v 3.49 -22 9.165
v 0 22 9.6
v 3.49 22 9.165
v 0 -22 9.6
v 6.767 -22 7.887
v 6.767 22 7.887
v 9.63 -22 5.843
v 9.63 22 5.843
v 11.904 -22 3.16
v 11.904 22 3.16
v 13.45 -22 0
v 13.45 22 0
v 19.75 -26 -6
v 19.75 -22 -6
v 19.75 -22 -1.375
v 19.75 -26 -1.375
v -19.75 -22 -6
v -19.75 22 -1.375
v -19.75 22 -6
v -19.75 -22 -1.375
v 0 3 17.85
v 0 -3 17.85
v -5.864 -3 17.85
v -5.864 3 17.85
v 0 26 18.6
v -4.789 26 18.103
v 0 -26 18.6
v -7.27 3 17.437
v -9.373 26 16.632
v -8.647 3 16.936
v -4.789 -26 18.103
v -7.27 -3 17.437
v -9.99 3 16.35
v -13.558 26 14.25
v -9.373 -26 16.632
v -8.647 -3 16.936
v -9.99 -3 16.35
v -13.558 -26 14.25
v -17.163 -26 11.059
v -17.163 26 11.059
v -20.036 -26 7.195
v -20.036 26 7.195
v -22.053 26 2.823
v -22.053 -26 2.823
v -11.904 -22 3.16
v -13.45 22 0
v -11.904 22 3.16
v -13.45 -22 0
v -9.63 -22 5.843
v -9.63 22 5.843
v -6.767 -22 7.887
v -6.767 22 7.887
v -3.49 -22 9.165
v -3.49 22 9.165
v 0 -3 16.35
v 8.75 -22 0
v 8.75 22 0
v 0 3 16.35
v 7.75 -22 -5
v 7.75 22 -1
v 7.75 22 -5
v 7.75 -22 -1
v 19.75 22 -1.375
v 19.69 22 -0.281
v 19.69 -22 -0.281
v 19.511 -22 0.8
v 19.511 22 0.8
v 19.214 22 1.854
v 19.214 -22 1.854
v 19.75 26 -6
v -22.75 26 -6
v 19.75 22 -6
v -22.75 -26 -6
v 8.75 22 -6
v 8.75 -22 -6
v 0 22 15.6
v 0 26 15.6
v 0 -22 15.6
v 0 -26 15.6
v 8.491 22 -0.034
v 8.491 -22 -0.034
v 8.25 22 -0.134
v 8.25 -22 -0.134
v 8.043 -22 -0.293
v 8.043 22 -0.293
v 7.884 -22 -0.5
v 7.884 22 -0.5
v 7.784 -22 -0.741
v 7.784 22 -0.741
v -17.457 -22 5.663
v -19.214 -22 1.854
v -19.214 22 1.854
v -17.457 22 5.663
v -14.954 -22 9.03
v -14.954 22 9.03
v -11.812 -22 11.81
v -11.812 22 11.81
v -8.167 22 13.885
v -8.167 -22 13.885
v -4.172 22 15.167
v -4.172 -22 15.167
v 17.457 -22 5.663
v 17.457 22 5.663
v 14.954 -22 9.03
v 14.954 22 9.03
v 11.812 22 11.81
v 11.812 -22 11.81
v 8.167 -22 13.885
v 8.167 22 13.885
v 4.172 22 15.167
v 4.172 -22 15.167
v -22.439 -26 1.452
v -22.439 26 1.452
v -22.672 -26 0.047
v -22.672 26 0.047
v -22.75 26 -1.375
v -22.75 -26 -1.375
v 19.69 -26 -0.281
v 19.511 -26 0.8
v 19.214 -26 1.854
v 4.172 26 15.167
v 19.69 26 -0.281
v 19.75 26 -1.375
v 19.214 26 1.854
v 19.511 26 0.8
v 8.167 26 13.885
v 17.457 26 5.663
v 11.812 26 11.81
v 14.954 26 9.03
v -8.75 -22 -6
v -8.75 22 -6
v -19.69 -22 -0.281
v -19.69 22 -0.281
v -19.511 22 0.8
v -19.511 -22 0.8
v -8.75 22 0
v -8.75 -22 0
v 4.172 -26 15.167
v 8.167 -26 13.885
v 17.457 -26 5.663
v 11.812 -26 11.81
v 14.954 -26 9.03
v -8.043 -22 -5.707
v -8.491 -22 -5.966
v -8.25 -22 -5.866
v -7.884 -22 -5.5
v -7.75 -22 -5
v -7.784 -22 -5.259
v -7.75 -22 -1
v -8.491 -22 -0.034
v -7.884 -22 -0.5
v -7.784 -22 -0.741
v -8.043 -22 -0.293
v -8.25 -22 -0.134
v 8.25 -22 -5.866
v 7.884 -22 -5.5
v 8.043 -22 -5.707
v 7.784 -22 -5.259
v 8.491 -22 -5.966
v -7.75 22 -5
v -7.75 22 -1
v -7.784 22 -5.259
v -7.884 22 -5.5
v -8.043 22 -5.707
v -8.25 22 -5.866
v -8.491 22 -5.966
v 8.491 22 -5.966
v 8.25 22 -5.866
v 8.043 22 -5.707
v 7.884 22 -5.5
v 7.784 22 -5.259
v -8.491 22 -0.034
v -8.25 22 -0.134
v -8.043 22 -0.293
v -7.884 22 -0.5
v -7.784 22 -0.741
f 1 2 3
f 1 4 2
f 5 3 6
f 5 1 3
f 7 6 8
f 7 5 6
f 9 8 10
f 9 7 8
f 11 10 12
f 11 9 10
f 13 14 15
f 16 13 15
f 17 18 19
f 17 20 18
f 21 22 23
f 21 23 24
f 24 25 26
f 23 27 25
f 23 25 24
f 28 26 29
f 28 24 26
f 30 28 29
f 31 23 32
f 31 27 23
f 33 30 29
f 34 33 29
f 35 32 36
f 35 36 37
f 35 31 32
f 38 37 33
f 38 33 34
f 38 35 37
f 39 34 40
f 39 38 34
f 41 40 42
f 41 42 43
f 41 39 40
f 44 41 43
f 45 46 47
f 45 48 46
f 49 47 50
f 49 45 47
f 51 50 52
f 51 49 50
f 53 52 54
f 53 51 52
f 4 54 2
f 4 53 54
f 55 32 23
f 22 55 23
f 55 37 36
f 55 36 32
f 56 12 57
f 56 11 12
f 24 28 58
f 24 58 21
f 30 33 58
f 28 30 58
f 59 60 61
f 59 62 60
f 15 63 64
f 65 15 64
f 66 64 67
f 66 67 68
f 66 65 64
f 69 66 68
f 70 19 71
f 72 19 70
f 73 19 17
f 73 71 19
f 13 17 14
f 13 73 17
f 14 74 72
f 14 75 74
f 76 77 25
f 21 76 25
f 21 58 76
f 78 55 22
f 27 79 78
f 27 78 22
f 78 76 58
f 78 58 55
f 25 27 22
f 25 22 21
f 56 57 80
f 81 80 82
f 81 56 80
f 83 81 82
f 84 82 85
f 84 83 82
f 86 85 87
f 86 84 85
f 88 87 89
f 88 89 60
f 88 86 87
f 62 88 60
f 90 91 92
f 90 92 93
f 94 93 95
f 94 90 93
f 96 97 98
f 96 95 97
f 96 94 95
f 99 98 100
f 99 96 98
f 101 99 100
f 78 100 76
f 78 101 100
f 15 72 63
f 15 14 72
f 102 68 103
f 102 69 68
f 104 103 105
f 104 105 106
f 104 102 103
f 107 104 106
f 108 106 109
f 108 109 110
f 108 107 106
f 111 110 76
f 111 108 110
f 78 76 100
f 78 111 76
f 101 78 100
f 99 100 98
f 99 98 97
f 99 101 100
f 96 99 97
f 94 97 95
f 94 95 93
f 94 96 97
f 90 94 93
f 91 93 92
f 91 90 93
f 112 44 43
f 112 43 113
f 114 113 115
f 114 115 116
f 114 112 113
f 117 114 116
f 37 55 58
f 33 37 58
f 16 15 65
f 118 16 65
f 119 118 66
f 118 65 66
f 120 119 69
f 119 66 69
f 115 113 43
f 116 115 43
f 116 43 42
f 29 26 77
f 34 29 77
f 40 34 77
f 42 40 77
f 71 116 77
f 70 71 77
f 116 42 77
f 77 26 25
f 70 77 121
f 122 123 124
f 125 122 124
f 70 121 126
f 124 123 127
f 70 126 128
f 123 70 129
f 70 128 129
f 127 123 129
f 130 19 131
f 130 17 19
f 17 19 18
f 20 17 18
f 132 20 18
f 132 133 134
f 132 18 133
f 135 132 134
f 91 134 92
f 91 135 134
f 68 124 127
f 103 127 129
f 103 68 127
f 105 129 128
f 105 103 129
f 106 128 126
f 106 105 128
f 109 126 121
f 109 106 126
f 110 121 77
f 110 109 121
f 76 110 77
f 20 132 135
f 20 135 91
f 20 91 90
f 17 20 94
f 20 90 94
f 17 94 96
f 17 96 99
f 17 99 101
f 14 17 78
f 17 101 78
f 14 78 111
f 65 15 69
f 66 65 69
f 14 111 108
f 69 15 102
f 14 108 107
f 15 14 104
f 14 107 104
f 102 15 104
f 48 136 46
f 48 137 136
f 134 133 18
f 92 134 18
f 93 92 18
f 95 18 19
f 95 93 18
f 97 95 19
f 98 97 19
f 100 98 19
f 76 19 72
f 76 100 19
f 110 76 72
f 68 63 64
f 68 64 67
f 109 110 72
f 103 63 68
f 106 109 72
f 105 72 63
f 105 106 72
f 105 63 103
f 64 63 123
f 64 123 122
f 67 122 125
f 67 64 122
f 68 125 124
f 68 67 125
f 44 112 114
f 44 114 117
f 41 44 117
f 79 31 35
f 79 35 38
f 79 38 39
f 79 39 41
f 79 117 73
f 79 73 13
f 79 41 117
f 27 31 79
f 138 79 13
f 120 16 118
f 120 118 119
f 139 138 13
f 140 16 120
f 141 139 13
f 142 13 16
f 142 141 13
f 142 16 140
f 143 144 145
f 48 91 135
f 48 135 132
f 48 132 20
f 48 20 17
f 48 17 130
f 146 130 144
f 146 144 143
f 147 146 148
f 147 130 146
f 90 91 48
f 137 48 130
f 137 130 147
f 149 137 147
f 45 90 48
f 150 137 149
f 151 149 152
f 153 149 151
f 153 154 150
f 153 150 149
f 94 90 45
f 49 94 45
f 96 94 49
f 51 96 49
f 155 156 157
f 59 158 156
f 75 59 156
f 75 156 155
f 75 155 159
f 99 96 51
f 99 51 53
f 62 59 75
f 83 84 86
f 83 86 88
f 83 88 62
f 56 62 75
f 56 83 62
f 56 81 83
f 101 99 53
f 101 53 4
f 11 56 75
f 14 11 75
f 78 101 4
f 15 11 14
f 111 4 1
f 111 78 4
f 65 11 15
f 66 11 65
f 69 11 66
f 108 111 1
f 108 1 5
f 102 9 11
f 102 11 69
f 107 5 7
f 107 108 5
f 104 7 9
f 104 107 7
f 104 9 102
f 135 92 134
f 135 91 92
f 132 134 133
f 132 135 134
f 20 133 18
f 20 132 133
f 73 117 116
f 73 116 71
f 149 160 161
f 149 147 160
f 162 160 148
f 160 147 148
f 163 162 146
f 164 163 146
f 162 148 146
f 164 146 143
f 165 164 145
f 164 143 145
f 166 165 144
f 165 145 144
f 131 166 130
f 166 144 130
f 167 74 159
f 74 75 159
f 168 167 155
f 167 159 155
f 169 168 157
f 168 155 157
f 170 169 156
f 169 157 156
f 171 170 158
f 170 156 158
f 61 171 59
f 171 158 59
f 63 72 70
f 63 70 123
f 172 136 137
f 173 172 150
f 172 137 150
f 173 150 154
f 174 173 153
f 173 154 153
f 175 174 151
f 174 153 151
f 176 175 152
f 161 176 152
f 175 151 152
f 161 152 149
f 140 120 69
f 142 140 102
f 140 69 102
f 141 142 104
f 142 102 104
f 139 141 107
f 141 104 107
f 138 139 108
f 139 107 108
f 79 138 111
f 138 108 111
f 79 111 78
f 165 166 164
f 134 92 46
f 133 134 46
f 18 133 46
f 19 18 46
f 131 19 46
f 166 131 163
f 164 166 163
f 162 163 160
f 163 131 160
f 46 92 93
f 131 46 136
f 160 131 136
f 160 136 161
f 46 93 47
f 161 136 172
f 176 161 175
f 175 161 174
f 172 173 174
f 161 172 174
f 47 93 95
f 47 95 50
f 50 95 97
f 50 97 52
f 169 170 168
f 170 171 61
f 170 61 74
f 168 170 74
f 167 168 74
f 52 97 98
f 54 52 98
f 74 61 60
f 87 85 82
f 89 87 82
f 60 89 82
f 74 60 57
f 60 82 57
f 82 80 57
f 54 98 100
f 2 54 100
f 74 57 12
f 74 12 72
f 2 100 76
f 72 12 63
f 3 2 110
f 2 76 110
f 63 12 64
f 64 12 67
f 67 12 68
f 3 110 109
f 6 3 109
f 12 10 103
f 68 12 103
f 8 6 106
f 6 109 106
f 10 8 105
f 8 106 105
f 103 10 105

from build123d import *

# Parameters (mm, degrees)
F1_DEPTH = 22
F10_R    = 1
F11_R    = 10
F3_DEPTH = 4
F7_DEPTH = 52
F8_W     = 6
F8_H     = 1.5
F9_DEPTH = 25


# Not quite as in the source:
# - a feature of the source that left no trace in its solid (it failed there, or was rolled back) is left out


with BuildPart() as f1:
    # F0 (on Front) → F1 (new body, symmetric)
    with BuildSketch(Plane.XZ):
        with BuildLine():
            Line((13.45, 0), (7.75, 0))
            Line((7.75, 0), (7.75, -6))
            Line((7.75, -6), (19.75, -6))
            Line((19.75, -6), (19.75, 0))
            ThreePointArc((19.75, 0), (12.583943142, 11.2295914778), (0, 15.6))
            Line((0, 15.6), (0, 9.6))
            ThreePointArc((0, 9.6), (8.2623014348, 6.9538233644), (13.45, 0))
        make_face()
        with BuildLine():
            ThreePointArc((-13.45, 0), (-8.2623014348, 6.9538233644), (0, 9.6))
            Line((0, 9.6), (0, 15.6))
            ThreePointArc((0, 15.6), (-12.583943142, 11.2295914778), (-19.75, 0))
            Line((-19.75, 0), (-19.75, -6))
            Line((-19.75, -6), (-7.75, -6))
            Line((-7.75, -6), (-7.75, 0))
            Line((-7.75, 0), (-13.45, 0))
        make_face()
    extrude(amount=F1_DEPTH, both=True)

    # F10
    f10_edges = [f1.edges().sort_by_distance(p)[0] for p in [
        (-7.75, 0, -6),
        (-7.75, 0, 0),
        (7.75, 0, 0),
        (7.75, 0, -6),
    ]]
    fillet(f10_edges, radius=F10_R)

    # F11
    f11_edges = [f1.edges().sort_by_distance(p)[0] for p in [
        (19.75, 0, 0),
        (-19.75, 0, 0),
    ]]
    fillet(f11_edges, radius=F11_R)


with BuildPart() as f3:
    # F2 (on face) → F3 (new body)
    with BuildSketch(Plane.XZ.offset(22)):
        with BuildLine():
            ThreePointArc((19.75, -1.3750270948), (19.6151352671, 0.2617704372), (19.2141787678, 1.8544187169))
            ThreePointArc((19.2141787678, 1.8544187169), (0, 15.6), (-19.2141787678, 1.8544187169))
            ThreePointArc((-19.2141787678, 1.8544187169), (-19.6151352671, 0.2617704372), (-19.75, -1.3750270948))
            Line((-19.75, -1.3750270948), (-19.75, -6))
            Line((-19.75, -6), (-8.75, -6))
            Line((-8.75, -6), (8.75, -6))
            Line((8.75, -6), (19.75, -6))
            Line((19.75, -6), (19.75, -1.3750270948))
        make_face()
    extrude(amount=F3_DEPTH)


with BuildPart() as f12_1:
    # F12: instance of F3
    add(f3.part.mirror(Plane.XZ))


with BuildPart() as f3_1:
    add(f3.part)

    add(f12_1.part)  # F7 merges F12_1
    # F6 (on face) → F7 (join, through all)
    with BuildSketch(Plane.XZ.offset(26)):
        with BuildLine():
            ThreePointArc((0, 18.6), (-13.5578357737, 14.2497366228), (-22.0534323982, 2.8232524604))
            ThreePointArc((-22.0534323982, 2.8232524604), (-22.5746758473, 0.7528096968), (-22.75, -1.3750270948))
            Line((-22.75, -1.3750270948), (-22.75, -6))
            Line((-22.75, -6), (-19.75, -6))
            Line((-19.75, -6), (-19.75, -1.3750270948))
            ThreePointArc((-19.75, -1.3750270948), (-19.6151352671, 0.2617704372), (-19.2141787678, 1.8544187169))
            ThreePointArc((-19.2141787678, 1.8544187169), (-11.8123417506, 11.8098082191), (0, 15.6))
            Line((0, 15.6), (0, 18.6))
        make_face()
    extrude(amount=-F7_DEPTH)

    # F8 (on face) → F9 (cut)
    with BuildSketch(Plane.YZ):
        with Locations((0, 17.0999999998)):
            Rectangle(F8_W, F8_H)
    extrude(amount=-F9_DEPTH, mode=Mode.SUBTRACT)


solid = Compound([f1.part, f3_1.part])
